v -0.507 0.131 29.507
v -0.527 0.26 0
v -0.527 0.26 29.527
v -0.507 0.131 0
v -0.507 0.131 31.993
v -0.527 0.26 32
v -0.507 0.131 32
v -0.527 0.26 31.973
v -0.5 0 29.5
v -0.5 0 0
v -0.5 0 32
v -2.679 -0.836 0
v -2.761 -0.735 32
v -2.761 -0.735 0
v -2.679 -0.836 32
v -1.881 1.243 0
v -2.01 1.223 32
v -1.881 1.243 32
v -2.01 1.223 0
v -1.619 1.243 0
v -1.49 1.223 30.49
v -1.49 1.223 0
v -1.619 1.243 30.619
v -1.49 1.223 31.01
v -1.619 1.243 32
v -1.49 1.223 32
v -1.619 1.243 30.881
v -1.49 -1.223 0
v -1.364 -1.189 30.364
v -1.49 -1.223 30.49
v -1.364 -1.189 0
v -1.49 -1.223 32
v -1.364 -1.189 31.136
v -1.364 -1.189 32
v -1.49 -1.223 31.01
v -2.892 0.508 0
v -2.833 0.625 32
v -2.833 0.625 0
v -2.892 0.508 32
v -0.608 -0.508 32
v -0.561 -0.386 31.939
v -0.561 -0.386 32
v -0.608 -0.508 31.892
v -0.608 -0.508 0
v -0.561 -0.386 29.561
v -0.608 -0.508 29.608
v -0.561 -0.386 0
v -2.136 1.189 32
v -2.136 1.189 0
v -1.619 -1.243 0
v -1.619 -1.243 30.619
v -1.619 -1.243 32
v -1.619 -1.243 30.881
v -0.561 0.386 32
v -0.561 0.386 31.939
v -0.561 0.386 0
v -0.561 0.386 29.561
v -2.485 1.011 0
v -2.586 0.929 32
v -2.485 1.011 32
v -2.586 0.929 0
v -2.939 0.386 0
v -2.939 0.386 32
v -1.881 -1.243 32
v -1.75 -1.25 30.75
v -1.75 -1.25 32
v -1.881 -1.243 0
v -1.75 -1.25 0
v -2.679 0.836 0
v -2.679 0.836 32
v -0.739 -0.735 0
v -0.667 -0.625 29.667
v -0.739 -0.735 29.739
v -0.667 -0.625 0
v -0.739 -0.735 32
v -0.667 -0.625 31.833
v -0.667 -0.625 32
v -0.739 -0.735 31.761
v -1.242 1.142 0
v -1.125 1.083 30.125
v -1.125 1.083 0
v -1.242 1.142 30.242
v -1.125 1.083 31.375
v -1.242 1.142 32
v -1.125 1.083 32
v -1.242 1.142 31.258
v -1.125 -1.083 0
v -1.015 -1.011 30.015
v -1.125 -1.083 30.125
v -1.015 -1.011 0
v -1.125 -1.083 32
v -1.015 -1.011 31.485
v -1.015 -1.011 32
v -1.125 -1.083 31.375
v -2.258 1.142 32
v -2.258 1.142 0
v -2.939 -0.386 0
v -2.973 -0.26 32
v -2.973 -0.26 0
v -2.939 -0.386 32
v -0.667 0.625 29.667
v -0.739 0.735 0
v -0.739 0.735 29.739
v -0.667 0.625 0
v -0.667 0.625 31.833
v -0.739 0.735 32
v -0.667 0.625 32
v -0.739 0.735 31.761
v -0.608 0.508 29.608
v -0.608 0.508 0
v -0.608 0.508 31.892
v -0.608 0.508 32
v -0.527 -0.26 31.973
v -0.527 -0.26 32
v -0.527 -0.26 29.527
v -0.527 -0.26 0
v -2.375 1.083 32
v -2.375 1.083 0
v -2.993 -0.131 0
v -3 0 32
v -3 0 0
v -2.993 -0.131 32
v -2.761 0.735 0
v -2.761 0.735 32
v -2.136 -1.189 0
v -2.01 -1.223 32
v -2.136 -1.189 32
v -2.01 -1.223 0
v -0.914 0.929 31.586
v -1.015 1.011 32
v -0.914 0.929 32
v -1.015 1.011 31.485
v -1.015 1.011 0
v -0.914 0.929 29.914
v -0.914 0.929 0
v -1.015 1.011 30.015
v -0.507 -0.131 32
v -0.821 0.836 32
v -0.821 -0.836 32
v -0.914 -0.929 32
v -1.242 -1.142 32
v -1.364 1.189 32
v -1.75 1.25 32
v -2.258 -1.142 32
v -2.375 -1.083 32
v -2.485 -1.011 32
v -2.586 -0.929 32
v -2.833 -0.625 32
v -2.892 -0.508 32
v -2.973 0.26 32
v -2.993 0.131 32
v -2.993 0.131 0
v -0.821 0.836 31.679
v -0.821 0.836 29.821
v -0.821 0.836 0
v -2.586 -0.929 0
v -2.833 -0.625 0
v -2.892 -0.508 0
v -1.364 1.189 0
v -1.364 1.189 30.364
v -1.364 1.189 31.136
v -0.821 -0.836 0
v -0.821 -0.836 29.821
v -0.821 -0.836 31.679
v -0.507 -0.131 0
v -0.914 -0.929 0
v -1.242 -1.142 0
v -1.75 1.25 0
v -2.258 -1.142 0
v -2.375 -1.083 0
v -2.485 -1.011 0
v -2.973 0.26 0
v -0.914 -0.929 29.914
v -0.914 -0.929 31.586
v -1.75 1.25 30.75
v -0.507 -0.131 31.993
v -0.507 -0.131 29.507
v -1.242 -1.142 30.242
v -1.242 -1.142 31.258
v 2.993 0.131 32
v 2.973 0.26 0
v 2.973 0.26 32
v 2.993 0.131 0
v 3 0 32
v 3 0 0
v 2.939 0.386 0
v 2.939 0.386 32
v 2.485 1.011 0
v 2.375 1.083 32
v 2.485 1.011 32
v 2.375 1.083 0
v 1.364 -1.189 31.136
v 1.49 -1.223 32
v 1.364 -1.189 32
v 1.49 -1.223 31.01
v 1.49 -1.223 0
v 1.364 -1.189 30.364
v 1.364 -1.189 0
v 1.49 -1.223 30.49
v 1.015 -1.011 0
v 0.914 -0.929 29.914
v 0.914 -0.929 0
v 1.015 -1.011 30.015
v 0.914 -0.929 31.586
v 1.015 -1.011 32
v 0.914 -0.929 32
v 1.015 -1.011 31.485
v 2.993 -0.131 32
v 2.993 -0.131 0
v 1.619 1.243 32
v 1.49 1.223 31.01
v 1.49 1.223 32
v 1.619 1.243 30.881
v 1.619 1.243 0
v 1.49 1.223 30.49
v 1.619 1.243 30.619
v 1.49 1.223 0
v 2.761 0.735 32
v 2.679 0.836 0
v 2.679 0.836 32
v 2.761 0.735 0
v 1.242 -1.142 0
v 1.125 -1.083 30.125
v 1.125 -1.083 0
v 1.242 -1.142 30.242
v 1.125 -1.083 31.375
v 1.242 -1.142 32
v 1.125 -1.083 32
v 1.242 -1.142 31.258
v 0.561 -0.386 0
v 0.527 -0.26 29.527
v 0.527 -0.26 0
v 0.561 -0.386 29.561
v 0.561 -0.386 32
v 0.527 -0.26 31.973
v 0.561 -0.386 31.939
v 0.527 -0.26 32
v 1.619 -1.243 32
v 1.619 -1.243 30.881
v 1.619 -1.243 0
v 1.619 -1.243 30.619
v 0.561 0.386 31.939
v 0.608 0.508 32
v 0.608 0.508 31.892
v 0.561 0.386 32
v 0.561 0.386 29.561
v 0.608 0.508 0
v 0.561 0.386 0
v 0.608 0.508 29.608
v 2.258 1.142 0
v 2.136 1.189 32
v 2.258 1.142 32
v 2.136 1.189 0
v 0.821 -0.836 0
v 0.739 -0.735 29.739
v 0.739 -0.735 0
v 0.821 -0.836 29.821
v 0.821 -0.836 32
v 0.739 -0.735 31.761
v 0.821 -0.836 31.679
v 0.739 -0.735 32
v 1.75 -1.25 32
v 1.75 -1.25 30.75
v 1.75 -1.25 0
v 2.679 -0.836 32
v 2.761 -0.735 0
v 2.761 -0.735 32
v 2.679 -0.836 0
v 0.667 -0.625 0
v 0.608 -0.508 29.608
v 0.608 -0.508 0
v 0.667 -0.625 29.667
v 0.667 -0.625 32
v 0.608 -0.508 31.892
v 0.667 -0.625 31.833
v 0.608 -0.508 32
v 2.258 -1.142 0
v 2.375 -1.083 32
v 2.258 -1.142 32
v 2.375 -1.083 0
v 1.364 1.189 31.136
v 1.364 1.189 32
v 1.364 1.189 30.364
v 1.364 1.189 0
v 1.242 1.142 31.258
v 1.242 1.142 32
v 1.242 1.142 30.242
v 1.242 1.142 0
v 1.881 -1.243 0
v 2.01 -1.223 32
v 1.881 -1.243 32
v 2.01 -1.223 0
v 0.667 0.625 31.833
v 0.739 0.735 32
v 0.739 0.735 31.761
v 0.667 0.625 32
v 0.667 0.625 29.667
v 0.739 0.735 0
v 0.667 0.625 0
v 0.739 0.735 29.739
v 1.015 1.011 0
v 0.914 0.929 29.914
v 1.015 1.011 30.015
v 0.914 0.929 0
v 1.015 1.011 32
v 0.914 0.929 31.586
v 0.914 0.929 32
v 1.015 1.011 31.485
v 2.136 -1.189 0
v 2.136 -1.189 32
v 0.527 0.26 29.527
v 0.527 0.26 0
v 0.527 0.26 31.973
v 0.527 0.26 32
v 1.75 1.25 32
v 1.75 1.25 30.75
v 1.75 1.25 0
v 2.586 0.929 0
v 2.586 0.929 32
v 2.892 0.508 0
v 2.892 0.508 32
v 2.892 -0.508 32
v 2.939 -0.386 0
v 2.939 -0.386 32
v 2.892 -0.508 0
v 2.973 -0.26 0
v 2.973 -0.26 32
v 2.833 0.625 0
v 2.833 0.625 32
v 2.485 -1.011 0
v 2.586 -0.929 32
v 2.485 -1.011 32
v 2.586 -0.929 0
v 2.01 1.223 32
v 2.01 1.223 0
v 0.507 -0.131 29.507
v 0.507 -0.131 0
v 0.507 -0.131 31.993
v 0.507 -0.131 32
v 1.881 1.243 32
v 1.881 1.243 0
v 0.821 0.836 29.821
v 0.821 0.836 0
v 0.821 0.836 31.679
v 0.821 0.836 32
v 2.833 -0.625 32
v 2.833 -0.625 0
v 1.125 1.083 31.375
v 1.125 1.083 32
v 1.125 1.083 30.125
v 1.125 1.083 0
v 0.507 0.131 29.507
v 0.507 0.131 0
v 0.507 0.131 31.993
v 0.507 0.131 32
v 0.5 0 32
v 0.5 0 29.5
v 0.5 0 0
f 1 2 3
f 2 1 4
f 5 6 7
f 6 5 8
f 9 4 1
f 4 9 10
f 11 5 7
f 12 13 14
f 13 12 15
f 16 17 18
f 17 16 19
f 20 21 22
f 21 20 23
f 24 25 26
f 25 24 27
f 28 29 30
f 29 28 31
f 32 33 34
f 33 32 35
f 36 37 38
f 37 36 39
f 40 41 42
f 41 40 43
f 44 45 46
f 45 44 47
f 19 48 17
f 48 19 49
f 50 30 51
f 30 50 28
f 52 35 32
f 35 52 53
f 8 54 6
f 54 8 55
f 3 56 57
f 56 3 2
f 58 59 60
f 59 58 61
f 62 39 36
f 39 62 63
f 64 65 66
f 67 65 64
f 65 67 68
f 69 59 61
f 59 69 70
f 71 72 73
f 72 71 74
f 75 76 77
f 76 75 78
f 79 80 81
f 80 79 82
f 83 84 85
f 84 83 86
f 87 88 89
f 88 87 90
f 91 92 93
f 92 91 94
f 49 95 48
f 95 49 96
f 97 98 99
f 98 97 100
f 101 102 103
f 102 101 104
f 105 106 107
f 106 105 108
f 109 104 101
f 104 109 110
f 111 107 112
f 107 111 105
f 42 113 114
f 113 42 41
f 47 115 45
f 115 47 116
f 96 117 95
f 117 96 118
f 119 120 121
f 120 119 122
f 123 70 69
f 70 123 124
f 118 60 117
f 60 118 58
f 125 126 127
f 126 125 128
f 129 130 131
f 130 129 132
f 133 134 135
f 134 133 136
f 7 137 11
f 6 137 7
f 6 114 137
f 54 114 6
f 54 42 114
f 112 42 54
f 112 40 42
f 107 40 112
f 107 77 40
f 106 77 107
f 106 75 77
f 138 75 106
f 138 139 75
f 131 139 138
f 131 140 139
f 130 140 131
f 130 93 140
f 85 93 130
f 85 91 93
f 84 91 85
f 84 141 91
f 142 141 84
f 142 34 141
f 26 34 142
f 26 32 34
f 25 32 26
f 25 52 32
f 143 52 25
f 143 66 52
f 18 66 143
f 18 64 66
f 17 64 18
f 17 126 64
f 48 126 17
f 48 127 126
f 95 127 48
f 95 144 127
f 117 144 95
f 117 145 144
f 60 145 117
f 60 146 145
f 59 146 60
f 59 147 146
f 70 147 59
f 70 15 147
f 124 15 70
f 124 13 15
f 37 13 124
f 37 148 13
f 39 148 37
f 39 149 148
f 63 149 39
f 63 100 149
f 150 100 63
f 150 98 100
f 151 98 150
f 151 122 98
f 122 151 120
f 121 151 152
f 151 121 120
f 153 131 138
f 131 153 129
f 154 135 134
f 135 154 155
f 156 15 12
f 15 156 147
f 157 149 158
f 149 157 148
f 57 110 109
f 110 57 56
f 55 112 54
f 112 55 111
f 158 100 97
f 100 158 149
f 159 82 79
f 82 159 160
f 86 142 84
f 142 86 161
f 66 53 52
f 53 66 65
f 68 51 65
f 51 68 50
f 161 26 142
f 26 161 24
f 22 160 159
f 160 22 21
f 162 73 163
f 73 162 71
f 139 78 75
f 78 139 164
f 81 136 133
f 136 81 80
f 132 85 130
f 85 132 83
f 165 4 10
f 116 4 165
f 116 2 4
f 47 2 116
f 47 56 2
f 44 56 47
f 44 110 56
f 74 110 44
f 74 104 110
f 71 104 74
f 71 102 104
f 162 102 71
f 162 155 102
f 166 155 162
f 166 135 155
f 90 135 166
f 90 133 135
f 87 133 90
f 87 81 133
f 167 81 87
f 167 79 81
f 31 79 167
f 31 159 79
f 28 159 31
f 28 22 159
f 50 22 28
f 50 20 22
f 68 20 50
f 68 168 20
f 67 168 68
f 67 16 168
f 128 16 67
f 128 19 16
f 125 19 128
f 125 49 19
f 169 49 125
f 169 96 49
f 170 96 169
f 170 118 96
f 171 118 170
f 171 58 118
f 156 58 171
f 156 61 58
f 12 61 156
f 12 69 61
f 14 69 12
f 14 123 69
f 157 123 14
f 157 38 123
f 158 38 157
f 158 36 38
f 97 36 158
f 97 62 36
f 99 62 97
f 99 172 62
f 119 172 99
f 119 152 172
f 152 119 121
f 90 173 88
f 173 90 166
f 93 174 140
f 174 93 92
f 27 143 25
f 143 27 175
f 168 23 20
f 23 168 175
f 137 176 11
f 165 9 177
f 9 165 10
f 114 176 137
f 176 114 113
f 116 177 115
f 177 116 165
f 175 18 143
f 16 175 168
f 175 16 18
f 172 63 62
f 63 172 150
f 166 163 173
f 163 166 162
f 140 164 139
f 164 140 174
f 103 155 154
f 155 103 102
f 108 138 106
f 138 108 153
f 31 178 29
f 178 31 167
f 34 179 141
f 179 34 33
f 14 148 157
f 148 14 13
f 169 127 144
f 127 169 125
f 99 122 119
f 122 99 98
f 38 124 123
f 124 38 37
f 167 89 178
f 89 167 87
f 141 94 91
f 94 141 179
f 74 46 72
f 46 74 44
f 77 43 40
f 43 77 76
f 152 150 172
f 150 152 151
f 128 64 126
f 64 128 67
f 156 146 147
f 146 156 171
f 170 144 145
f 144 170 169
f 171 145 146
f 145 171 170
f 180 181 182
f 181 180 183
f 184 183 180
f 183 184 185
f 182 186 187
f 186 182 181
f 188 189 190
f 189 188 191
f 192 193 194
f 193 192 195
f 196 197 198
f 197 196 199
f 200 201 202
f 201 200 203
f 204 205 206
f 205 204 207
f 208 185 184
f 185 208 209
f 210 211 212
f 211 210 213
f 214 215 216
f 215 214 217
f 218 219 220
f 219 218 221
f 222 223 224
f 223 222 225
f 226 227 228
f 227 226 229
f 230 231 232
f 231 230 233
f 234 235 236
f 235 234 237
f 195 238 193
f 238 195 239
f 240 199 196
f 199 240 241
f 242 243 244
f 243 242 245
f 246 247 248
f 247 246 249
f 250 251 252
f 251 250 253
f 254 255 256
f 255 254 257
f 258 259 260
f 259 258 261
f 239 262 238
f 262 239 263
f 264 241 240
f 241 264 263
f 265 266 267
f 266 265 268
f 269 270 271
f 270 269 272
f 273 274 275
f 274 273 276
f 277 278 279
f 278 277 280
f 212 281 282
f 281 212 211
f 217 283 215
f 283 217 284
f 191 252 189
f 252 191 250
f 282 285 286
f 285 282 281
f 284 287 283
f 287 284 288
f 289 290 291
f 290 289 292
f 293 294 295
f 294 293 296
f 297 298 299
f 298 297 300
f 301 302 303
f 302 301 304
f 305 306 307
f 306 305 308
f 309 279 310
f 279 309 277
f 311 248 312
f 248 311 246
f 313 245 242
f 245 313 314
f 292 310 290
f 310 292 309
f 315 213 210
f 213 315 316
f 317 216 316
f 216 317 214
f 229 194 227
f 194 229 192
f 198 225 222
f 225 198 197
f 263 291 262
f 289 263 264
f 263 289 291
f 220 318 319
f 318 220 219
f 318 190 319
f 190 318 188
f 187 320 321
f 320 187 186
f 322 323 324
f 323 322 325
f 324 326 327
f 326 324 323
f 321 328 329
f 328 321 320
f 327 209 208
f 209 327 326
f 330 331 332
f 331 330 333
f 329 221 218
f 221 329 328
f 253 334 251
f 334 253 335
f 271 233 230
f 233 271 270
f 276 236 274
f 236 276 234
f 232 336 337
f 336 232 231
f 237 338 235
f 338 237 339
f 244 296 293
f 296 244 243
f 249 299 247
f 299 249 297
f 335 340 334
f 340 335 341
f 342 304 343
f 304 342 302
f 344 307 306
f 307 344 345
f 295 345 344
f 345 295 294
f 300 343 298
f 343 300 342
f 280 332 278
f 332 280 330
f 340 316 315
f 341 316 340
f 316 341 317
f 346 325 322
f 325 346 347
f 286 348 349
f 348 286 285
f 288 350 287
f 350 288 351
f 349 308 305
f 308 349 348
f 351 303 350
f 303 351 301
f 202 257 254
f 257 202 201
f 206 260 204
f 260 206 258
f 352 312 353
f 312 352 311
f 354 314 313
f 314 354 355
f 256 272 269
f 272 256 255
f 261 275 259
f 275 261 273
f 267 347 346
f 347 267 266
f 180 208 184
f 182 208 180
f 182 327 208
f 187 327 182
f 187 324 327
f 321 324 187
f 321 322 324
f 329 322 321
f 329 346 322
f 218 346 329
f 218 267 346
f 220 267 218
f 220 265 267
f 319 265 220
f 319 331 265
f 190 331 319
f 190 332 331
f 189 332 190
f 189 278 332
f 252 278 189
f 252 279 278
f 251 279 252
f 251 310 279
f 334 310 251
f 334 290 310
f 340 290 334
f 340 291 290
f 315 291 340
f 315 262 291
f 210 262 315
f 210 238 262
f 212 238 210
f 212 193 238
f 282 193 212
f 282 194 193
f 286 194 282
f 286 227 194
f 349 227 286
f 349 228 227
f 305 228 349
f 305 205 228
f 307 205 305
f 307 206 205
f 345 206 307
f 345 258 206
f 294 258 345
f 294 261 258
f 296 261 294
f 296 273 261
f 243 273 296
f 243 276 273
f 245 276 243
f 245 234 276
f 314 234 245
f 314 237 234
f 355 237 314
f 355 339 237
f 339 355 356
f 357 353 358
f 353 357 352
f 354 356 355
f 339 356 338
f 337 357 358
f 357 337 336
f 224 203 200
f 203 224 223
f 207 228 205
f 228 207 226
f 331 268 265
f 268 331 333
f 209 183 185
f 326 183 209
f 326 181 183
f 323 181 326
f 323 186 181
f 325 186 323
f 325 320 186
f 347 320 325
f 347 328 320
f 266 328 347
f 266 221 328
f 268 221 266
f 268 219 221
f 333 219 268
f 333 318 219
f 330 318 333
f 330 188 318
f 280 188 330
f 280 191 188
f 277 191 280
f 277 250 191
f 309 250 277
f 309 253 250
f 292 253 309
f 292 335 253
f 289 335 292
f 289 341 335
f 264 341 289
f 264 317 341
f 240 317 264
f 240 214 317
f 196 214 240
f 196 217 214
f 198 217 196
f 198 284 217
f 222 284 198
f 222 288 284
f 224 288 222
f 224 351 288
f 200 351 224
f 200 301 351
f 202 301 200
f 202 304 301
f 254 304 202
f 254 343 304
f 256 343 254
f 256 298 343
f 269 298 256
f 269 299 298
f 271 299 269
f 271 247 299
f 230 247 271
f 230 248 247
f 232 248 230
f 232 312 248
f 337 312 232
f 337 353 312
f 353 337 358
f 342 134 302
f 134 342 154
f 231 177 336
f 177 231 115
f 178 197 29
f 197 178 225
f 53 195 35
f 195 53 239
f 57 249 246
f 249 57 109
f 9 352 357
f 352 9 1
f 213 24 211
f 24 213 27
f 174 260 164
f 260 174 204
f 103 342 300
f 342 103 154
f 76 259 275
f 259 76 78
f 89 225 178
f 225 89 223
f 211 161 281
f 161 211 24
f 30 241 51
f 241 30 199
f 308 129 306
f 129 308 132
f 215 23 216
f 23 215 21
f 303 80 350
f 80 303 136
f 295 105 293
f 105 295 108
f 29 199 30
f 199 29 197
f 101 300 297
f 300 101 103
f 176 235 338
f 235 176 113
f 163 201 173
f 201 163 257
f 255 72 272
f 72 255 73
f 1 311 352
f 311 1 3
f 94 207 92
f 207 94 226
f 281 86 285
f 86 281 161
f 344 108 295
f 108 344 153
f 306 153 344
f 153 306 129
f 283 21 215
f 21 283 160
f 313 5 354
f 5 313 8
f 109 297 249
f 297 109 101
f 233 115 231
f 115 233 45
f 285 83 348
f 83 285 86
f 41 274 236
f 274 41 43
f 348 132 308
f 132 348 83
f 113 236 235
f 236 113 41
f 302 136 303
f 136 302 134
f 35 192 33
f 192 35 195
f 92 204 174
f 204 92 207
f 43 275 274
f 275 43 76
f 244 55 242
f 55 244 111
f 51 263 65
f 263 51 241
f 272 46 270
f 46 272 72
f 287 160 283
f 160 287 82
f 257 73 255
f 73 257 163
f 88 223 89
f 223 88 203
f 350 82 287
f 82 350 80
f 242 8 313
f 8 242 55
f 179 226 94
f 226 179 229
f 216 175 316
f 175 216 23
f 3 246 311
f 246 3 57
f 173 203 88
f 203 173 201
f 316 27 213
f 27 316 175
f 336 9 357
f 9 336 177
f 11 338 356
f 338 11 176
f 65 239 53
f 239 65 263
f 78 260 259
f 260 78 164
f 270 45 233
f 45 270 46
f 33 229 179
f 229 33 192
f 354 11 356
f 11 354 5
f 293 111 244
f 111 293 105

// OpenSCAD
// Two-prong cotter pin.
$fn = 60;
eps = 0.02;
wire_d = 2.5;
length = 32;
prong_gap = wire_d*1.4;
union() {
    translate([-prong_gap/2,0,0]) cylinder(d=wire_d,h=length);
    translate([prong_gap/2,0,0]) cylinder(d=wire_d,h=length);
    translate([-prong_gap/2,0,length-wire_d/2]) rotate([0,90,0]) cylinder(d=wire_d,h=prong_gap);
}
